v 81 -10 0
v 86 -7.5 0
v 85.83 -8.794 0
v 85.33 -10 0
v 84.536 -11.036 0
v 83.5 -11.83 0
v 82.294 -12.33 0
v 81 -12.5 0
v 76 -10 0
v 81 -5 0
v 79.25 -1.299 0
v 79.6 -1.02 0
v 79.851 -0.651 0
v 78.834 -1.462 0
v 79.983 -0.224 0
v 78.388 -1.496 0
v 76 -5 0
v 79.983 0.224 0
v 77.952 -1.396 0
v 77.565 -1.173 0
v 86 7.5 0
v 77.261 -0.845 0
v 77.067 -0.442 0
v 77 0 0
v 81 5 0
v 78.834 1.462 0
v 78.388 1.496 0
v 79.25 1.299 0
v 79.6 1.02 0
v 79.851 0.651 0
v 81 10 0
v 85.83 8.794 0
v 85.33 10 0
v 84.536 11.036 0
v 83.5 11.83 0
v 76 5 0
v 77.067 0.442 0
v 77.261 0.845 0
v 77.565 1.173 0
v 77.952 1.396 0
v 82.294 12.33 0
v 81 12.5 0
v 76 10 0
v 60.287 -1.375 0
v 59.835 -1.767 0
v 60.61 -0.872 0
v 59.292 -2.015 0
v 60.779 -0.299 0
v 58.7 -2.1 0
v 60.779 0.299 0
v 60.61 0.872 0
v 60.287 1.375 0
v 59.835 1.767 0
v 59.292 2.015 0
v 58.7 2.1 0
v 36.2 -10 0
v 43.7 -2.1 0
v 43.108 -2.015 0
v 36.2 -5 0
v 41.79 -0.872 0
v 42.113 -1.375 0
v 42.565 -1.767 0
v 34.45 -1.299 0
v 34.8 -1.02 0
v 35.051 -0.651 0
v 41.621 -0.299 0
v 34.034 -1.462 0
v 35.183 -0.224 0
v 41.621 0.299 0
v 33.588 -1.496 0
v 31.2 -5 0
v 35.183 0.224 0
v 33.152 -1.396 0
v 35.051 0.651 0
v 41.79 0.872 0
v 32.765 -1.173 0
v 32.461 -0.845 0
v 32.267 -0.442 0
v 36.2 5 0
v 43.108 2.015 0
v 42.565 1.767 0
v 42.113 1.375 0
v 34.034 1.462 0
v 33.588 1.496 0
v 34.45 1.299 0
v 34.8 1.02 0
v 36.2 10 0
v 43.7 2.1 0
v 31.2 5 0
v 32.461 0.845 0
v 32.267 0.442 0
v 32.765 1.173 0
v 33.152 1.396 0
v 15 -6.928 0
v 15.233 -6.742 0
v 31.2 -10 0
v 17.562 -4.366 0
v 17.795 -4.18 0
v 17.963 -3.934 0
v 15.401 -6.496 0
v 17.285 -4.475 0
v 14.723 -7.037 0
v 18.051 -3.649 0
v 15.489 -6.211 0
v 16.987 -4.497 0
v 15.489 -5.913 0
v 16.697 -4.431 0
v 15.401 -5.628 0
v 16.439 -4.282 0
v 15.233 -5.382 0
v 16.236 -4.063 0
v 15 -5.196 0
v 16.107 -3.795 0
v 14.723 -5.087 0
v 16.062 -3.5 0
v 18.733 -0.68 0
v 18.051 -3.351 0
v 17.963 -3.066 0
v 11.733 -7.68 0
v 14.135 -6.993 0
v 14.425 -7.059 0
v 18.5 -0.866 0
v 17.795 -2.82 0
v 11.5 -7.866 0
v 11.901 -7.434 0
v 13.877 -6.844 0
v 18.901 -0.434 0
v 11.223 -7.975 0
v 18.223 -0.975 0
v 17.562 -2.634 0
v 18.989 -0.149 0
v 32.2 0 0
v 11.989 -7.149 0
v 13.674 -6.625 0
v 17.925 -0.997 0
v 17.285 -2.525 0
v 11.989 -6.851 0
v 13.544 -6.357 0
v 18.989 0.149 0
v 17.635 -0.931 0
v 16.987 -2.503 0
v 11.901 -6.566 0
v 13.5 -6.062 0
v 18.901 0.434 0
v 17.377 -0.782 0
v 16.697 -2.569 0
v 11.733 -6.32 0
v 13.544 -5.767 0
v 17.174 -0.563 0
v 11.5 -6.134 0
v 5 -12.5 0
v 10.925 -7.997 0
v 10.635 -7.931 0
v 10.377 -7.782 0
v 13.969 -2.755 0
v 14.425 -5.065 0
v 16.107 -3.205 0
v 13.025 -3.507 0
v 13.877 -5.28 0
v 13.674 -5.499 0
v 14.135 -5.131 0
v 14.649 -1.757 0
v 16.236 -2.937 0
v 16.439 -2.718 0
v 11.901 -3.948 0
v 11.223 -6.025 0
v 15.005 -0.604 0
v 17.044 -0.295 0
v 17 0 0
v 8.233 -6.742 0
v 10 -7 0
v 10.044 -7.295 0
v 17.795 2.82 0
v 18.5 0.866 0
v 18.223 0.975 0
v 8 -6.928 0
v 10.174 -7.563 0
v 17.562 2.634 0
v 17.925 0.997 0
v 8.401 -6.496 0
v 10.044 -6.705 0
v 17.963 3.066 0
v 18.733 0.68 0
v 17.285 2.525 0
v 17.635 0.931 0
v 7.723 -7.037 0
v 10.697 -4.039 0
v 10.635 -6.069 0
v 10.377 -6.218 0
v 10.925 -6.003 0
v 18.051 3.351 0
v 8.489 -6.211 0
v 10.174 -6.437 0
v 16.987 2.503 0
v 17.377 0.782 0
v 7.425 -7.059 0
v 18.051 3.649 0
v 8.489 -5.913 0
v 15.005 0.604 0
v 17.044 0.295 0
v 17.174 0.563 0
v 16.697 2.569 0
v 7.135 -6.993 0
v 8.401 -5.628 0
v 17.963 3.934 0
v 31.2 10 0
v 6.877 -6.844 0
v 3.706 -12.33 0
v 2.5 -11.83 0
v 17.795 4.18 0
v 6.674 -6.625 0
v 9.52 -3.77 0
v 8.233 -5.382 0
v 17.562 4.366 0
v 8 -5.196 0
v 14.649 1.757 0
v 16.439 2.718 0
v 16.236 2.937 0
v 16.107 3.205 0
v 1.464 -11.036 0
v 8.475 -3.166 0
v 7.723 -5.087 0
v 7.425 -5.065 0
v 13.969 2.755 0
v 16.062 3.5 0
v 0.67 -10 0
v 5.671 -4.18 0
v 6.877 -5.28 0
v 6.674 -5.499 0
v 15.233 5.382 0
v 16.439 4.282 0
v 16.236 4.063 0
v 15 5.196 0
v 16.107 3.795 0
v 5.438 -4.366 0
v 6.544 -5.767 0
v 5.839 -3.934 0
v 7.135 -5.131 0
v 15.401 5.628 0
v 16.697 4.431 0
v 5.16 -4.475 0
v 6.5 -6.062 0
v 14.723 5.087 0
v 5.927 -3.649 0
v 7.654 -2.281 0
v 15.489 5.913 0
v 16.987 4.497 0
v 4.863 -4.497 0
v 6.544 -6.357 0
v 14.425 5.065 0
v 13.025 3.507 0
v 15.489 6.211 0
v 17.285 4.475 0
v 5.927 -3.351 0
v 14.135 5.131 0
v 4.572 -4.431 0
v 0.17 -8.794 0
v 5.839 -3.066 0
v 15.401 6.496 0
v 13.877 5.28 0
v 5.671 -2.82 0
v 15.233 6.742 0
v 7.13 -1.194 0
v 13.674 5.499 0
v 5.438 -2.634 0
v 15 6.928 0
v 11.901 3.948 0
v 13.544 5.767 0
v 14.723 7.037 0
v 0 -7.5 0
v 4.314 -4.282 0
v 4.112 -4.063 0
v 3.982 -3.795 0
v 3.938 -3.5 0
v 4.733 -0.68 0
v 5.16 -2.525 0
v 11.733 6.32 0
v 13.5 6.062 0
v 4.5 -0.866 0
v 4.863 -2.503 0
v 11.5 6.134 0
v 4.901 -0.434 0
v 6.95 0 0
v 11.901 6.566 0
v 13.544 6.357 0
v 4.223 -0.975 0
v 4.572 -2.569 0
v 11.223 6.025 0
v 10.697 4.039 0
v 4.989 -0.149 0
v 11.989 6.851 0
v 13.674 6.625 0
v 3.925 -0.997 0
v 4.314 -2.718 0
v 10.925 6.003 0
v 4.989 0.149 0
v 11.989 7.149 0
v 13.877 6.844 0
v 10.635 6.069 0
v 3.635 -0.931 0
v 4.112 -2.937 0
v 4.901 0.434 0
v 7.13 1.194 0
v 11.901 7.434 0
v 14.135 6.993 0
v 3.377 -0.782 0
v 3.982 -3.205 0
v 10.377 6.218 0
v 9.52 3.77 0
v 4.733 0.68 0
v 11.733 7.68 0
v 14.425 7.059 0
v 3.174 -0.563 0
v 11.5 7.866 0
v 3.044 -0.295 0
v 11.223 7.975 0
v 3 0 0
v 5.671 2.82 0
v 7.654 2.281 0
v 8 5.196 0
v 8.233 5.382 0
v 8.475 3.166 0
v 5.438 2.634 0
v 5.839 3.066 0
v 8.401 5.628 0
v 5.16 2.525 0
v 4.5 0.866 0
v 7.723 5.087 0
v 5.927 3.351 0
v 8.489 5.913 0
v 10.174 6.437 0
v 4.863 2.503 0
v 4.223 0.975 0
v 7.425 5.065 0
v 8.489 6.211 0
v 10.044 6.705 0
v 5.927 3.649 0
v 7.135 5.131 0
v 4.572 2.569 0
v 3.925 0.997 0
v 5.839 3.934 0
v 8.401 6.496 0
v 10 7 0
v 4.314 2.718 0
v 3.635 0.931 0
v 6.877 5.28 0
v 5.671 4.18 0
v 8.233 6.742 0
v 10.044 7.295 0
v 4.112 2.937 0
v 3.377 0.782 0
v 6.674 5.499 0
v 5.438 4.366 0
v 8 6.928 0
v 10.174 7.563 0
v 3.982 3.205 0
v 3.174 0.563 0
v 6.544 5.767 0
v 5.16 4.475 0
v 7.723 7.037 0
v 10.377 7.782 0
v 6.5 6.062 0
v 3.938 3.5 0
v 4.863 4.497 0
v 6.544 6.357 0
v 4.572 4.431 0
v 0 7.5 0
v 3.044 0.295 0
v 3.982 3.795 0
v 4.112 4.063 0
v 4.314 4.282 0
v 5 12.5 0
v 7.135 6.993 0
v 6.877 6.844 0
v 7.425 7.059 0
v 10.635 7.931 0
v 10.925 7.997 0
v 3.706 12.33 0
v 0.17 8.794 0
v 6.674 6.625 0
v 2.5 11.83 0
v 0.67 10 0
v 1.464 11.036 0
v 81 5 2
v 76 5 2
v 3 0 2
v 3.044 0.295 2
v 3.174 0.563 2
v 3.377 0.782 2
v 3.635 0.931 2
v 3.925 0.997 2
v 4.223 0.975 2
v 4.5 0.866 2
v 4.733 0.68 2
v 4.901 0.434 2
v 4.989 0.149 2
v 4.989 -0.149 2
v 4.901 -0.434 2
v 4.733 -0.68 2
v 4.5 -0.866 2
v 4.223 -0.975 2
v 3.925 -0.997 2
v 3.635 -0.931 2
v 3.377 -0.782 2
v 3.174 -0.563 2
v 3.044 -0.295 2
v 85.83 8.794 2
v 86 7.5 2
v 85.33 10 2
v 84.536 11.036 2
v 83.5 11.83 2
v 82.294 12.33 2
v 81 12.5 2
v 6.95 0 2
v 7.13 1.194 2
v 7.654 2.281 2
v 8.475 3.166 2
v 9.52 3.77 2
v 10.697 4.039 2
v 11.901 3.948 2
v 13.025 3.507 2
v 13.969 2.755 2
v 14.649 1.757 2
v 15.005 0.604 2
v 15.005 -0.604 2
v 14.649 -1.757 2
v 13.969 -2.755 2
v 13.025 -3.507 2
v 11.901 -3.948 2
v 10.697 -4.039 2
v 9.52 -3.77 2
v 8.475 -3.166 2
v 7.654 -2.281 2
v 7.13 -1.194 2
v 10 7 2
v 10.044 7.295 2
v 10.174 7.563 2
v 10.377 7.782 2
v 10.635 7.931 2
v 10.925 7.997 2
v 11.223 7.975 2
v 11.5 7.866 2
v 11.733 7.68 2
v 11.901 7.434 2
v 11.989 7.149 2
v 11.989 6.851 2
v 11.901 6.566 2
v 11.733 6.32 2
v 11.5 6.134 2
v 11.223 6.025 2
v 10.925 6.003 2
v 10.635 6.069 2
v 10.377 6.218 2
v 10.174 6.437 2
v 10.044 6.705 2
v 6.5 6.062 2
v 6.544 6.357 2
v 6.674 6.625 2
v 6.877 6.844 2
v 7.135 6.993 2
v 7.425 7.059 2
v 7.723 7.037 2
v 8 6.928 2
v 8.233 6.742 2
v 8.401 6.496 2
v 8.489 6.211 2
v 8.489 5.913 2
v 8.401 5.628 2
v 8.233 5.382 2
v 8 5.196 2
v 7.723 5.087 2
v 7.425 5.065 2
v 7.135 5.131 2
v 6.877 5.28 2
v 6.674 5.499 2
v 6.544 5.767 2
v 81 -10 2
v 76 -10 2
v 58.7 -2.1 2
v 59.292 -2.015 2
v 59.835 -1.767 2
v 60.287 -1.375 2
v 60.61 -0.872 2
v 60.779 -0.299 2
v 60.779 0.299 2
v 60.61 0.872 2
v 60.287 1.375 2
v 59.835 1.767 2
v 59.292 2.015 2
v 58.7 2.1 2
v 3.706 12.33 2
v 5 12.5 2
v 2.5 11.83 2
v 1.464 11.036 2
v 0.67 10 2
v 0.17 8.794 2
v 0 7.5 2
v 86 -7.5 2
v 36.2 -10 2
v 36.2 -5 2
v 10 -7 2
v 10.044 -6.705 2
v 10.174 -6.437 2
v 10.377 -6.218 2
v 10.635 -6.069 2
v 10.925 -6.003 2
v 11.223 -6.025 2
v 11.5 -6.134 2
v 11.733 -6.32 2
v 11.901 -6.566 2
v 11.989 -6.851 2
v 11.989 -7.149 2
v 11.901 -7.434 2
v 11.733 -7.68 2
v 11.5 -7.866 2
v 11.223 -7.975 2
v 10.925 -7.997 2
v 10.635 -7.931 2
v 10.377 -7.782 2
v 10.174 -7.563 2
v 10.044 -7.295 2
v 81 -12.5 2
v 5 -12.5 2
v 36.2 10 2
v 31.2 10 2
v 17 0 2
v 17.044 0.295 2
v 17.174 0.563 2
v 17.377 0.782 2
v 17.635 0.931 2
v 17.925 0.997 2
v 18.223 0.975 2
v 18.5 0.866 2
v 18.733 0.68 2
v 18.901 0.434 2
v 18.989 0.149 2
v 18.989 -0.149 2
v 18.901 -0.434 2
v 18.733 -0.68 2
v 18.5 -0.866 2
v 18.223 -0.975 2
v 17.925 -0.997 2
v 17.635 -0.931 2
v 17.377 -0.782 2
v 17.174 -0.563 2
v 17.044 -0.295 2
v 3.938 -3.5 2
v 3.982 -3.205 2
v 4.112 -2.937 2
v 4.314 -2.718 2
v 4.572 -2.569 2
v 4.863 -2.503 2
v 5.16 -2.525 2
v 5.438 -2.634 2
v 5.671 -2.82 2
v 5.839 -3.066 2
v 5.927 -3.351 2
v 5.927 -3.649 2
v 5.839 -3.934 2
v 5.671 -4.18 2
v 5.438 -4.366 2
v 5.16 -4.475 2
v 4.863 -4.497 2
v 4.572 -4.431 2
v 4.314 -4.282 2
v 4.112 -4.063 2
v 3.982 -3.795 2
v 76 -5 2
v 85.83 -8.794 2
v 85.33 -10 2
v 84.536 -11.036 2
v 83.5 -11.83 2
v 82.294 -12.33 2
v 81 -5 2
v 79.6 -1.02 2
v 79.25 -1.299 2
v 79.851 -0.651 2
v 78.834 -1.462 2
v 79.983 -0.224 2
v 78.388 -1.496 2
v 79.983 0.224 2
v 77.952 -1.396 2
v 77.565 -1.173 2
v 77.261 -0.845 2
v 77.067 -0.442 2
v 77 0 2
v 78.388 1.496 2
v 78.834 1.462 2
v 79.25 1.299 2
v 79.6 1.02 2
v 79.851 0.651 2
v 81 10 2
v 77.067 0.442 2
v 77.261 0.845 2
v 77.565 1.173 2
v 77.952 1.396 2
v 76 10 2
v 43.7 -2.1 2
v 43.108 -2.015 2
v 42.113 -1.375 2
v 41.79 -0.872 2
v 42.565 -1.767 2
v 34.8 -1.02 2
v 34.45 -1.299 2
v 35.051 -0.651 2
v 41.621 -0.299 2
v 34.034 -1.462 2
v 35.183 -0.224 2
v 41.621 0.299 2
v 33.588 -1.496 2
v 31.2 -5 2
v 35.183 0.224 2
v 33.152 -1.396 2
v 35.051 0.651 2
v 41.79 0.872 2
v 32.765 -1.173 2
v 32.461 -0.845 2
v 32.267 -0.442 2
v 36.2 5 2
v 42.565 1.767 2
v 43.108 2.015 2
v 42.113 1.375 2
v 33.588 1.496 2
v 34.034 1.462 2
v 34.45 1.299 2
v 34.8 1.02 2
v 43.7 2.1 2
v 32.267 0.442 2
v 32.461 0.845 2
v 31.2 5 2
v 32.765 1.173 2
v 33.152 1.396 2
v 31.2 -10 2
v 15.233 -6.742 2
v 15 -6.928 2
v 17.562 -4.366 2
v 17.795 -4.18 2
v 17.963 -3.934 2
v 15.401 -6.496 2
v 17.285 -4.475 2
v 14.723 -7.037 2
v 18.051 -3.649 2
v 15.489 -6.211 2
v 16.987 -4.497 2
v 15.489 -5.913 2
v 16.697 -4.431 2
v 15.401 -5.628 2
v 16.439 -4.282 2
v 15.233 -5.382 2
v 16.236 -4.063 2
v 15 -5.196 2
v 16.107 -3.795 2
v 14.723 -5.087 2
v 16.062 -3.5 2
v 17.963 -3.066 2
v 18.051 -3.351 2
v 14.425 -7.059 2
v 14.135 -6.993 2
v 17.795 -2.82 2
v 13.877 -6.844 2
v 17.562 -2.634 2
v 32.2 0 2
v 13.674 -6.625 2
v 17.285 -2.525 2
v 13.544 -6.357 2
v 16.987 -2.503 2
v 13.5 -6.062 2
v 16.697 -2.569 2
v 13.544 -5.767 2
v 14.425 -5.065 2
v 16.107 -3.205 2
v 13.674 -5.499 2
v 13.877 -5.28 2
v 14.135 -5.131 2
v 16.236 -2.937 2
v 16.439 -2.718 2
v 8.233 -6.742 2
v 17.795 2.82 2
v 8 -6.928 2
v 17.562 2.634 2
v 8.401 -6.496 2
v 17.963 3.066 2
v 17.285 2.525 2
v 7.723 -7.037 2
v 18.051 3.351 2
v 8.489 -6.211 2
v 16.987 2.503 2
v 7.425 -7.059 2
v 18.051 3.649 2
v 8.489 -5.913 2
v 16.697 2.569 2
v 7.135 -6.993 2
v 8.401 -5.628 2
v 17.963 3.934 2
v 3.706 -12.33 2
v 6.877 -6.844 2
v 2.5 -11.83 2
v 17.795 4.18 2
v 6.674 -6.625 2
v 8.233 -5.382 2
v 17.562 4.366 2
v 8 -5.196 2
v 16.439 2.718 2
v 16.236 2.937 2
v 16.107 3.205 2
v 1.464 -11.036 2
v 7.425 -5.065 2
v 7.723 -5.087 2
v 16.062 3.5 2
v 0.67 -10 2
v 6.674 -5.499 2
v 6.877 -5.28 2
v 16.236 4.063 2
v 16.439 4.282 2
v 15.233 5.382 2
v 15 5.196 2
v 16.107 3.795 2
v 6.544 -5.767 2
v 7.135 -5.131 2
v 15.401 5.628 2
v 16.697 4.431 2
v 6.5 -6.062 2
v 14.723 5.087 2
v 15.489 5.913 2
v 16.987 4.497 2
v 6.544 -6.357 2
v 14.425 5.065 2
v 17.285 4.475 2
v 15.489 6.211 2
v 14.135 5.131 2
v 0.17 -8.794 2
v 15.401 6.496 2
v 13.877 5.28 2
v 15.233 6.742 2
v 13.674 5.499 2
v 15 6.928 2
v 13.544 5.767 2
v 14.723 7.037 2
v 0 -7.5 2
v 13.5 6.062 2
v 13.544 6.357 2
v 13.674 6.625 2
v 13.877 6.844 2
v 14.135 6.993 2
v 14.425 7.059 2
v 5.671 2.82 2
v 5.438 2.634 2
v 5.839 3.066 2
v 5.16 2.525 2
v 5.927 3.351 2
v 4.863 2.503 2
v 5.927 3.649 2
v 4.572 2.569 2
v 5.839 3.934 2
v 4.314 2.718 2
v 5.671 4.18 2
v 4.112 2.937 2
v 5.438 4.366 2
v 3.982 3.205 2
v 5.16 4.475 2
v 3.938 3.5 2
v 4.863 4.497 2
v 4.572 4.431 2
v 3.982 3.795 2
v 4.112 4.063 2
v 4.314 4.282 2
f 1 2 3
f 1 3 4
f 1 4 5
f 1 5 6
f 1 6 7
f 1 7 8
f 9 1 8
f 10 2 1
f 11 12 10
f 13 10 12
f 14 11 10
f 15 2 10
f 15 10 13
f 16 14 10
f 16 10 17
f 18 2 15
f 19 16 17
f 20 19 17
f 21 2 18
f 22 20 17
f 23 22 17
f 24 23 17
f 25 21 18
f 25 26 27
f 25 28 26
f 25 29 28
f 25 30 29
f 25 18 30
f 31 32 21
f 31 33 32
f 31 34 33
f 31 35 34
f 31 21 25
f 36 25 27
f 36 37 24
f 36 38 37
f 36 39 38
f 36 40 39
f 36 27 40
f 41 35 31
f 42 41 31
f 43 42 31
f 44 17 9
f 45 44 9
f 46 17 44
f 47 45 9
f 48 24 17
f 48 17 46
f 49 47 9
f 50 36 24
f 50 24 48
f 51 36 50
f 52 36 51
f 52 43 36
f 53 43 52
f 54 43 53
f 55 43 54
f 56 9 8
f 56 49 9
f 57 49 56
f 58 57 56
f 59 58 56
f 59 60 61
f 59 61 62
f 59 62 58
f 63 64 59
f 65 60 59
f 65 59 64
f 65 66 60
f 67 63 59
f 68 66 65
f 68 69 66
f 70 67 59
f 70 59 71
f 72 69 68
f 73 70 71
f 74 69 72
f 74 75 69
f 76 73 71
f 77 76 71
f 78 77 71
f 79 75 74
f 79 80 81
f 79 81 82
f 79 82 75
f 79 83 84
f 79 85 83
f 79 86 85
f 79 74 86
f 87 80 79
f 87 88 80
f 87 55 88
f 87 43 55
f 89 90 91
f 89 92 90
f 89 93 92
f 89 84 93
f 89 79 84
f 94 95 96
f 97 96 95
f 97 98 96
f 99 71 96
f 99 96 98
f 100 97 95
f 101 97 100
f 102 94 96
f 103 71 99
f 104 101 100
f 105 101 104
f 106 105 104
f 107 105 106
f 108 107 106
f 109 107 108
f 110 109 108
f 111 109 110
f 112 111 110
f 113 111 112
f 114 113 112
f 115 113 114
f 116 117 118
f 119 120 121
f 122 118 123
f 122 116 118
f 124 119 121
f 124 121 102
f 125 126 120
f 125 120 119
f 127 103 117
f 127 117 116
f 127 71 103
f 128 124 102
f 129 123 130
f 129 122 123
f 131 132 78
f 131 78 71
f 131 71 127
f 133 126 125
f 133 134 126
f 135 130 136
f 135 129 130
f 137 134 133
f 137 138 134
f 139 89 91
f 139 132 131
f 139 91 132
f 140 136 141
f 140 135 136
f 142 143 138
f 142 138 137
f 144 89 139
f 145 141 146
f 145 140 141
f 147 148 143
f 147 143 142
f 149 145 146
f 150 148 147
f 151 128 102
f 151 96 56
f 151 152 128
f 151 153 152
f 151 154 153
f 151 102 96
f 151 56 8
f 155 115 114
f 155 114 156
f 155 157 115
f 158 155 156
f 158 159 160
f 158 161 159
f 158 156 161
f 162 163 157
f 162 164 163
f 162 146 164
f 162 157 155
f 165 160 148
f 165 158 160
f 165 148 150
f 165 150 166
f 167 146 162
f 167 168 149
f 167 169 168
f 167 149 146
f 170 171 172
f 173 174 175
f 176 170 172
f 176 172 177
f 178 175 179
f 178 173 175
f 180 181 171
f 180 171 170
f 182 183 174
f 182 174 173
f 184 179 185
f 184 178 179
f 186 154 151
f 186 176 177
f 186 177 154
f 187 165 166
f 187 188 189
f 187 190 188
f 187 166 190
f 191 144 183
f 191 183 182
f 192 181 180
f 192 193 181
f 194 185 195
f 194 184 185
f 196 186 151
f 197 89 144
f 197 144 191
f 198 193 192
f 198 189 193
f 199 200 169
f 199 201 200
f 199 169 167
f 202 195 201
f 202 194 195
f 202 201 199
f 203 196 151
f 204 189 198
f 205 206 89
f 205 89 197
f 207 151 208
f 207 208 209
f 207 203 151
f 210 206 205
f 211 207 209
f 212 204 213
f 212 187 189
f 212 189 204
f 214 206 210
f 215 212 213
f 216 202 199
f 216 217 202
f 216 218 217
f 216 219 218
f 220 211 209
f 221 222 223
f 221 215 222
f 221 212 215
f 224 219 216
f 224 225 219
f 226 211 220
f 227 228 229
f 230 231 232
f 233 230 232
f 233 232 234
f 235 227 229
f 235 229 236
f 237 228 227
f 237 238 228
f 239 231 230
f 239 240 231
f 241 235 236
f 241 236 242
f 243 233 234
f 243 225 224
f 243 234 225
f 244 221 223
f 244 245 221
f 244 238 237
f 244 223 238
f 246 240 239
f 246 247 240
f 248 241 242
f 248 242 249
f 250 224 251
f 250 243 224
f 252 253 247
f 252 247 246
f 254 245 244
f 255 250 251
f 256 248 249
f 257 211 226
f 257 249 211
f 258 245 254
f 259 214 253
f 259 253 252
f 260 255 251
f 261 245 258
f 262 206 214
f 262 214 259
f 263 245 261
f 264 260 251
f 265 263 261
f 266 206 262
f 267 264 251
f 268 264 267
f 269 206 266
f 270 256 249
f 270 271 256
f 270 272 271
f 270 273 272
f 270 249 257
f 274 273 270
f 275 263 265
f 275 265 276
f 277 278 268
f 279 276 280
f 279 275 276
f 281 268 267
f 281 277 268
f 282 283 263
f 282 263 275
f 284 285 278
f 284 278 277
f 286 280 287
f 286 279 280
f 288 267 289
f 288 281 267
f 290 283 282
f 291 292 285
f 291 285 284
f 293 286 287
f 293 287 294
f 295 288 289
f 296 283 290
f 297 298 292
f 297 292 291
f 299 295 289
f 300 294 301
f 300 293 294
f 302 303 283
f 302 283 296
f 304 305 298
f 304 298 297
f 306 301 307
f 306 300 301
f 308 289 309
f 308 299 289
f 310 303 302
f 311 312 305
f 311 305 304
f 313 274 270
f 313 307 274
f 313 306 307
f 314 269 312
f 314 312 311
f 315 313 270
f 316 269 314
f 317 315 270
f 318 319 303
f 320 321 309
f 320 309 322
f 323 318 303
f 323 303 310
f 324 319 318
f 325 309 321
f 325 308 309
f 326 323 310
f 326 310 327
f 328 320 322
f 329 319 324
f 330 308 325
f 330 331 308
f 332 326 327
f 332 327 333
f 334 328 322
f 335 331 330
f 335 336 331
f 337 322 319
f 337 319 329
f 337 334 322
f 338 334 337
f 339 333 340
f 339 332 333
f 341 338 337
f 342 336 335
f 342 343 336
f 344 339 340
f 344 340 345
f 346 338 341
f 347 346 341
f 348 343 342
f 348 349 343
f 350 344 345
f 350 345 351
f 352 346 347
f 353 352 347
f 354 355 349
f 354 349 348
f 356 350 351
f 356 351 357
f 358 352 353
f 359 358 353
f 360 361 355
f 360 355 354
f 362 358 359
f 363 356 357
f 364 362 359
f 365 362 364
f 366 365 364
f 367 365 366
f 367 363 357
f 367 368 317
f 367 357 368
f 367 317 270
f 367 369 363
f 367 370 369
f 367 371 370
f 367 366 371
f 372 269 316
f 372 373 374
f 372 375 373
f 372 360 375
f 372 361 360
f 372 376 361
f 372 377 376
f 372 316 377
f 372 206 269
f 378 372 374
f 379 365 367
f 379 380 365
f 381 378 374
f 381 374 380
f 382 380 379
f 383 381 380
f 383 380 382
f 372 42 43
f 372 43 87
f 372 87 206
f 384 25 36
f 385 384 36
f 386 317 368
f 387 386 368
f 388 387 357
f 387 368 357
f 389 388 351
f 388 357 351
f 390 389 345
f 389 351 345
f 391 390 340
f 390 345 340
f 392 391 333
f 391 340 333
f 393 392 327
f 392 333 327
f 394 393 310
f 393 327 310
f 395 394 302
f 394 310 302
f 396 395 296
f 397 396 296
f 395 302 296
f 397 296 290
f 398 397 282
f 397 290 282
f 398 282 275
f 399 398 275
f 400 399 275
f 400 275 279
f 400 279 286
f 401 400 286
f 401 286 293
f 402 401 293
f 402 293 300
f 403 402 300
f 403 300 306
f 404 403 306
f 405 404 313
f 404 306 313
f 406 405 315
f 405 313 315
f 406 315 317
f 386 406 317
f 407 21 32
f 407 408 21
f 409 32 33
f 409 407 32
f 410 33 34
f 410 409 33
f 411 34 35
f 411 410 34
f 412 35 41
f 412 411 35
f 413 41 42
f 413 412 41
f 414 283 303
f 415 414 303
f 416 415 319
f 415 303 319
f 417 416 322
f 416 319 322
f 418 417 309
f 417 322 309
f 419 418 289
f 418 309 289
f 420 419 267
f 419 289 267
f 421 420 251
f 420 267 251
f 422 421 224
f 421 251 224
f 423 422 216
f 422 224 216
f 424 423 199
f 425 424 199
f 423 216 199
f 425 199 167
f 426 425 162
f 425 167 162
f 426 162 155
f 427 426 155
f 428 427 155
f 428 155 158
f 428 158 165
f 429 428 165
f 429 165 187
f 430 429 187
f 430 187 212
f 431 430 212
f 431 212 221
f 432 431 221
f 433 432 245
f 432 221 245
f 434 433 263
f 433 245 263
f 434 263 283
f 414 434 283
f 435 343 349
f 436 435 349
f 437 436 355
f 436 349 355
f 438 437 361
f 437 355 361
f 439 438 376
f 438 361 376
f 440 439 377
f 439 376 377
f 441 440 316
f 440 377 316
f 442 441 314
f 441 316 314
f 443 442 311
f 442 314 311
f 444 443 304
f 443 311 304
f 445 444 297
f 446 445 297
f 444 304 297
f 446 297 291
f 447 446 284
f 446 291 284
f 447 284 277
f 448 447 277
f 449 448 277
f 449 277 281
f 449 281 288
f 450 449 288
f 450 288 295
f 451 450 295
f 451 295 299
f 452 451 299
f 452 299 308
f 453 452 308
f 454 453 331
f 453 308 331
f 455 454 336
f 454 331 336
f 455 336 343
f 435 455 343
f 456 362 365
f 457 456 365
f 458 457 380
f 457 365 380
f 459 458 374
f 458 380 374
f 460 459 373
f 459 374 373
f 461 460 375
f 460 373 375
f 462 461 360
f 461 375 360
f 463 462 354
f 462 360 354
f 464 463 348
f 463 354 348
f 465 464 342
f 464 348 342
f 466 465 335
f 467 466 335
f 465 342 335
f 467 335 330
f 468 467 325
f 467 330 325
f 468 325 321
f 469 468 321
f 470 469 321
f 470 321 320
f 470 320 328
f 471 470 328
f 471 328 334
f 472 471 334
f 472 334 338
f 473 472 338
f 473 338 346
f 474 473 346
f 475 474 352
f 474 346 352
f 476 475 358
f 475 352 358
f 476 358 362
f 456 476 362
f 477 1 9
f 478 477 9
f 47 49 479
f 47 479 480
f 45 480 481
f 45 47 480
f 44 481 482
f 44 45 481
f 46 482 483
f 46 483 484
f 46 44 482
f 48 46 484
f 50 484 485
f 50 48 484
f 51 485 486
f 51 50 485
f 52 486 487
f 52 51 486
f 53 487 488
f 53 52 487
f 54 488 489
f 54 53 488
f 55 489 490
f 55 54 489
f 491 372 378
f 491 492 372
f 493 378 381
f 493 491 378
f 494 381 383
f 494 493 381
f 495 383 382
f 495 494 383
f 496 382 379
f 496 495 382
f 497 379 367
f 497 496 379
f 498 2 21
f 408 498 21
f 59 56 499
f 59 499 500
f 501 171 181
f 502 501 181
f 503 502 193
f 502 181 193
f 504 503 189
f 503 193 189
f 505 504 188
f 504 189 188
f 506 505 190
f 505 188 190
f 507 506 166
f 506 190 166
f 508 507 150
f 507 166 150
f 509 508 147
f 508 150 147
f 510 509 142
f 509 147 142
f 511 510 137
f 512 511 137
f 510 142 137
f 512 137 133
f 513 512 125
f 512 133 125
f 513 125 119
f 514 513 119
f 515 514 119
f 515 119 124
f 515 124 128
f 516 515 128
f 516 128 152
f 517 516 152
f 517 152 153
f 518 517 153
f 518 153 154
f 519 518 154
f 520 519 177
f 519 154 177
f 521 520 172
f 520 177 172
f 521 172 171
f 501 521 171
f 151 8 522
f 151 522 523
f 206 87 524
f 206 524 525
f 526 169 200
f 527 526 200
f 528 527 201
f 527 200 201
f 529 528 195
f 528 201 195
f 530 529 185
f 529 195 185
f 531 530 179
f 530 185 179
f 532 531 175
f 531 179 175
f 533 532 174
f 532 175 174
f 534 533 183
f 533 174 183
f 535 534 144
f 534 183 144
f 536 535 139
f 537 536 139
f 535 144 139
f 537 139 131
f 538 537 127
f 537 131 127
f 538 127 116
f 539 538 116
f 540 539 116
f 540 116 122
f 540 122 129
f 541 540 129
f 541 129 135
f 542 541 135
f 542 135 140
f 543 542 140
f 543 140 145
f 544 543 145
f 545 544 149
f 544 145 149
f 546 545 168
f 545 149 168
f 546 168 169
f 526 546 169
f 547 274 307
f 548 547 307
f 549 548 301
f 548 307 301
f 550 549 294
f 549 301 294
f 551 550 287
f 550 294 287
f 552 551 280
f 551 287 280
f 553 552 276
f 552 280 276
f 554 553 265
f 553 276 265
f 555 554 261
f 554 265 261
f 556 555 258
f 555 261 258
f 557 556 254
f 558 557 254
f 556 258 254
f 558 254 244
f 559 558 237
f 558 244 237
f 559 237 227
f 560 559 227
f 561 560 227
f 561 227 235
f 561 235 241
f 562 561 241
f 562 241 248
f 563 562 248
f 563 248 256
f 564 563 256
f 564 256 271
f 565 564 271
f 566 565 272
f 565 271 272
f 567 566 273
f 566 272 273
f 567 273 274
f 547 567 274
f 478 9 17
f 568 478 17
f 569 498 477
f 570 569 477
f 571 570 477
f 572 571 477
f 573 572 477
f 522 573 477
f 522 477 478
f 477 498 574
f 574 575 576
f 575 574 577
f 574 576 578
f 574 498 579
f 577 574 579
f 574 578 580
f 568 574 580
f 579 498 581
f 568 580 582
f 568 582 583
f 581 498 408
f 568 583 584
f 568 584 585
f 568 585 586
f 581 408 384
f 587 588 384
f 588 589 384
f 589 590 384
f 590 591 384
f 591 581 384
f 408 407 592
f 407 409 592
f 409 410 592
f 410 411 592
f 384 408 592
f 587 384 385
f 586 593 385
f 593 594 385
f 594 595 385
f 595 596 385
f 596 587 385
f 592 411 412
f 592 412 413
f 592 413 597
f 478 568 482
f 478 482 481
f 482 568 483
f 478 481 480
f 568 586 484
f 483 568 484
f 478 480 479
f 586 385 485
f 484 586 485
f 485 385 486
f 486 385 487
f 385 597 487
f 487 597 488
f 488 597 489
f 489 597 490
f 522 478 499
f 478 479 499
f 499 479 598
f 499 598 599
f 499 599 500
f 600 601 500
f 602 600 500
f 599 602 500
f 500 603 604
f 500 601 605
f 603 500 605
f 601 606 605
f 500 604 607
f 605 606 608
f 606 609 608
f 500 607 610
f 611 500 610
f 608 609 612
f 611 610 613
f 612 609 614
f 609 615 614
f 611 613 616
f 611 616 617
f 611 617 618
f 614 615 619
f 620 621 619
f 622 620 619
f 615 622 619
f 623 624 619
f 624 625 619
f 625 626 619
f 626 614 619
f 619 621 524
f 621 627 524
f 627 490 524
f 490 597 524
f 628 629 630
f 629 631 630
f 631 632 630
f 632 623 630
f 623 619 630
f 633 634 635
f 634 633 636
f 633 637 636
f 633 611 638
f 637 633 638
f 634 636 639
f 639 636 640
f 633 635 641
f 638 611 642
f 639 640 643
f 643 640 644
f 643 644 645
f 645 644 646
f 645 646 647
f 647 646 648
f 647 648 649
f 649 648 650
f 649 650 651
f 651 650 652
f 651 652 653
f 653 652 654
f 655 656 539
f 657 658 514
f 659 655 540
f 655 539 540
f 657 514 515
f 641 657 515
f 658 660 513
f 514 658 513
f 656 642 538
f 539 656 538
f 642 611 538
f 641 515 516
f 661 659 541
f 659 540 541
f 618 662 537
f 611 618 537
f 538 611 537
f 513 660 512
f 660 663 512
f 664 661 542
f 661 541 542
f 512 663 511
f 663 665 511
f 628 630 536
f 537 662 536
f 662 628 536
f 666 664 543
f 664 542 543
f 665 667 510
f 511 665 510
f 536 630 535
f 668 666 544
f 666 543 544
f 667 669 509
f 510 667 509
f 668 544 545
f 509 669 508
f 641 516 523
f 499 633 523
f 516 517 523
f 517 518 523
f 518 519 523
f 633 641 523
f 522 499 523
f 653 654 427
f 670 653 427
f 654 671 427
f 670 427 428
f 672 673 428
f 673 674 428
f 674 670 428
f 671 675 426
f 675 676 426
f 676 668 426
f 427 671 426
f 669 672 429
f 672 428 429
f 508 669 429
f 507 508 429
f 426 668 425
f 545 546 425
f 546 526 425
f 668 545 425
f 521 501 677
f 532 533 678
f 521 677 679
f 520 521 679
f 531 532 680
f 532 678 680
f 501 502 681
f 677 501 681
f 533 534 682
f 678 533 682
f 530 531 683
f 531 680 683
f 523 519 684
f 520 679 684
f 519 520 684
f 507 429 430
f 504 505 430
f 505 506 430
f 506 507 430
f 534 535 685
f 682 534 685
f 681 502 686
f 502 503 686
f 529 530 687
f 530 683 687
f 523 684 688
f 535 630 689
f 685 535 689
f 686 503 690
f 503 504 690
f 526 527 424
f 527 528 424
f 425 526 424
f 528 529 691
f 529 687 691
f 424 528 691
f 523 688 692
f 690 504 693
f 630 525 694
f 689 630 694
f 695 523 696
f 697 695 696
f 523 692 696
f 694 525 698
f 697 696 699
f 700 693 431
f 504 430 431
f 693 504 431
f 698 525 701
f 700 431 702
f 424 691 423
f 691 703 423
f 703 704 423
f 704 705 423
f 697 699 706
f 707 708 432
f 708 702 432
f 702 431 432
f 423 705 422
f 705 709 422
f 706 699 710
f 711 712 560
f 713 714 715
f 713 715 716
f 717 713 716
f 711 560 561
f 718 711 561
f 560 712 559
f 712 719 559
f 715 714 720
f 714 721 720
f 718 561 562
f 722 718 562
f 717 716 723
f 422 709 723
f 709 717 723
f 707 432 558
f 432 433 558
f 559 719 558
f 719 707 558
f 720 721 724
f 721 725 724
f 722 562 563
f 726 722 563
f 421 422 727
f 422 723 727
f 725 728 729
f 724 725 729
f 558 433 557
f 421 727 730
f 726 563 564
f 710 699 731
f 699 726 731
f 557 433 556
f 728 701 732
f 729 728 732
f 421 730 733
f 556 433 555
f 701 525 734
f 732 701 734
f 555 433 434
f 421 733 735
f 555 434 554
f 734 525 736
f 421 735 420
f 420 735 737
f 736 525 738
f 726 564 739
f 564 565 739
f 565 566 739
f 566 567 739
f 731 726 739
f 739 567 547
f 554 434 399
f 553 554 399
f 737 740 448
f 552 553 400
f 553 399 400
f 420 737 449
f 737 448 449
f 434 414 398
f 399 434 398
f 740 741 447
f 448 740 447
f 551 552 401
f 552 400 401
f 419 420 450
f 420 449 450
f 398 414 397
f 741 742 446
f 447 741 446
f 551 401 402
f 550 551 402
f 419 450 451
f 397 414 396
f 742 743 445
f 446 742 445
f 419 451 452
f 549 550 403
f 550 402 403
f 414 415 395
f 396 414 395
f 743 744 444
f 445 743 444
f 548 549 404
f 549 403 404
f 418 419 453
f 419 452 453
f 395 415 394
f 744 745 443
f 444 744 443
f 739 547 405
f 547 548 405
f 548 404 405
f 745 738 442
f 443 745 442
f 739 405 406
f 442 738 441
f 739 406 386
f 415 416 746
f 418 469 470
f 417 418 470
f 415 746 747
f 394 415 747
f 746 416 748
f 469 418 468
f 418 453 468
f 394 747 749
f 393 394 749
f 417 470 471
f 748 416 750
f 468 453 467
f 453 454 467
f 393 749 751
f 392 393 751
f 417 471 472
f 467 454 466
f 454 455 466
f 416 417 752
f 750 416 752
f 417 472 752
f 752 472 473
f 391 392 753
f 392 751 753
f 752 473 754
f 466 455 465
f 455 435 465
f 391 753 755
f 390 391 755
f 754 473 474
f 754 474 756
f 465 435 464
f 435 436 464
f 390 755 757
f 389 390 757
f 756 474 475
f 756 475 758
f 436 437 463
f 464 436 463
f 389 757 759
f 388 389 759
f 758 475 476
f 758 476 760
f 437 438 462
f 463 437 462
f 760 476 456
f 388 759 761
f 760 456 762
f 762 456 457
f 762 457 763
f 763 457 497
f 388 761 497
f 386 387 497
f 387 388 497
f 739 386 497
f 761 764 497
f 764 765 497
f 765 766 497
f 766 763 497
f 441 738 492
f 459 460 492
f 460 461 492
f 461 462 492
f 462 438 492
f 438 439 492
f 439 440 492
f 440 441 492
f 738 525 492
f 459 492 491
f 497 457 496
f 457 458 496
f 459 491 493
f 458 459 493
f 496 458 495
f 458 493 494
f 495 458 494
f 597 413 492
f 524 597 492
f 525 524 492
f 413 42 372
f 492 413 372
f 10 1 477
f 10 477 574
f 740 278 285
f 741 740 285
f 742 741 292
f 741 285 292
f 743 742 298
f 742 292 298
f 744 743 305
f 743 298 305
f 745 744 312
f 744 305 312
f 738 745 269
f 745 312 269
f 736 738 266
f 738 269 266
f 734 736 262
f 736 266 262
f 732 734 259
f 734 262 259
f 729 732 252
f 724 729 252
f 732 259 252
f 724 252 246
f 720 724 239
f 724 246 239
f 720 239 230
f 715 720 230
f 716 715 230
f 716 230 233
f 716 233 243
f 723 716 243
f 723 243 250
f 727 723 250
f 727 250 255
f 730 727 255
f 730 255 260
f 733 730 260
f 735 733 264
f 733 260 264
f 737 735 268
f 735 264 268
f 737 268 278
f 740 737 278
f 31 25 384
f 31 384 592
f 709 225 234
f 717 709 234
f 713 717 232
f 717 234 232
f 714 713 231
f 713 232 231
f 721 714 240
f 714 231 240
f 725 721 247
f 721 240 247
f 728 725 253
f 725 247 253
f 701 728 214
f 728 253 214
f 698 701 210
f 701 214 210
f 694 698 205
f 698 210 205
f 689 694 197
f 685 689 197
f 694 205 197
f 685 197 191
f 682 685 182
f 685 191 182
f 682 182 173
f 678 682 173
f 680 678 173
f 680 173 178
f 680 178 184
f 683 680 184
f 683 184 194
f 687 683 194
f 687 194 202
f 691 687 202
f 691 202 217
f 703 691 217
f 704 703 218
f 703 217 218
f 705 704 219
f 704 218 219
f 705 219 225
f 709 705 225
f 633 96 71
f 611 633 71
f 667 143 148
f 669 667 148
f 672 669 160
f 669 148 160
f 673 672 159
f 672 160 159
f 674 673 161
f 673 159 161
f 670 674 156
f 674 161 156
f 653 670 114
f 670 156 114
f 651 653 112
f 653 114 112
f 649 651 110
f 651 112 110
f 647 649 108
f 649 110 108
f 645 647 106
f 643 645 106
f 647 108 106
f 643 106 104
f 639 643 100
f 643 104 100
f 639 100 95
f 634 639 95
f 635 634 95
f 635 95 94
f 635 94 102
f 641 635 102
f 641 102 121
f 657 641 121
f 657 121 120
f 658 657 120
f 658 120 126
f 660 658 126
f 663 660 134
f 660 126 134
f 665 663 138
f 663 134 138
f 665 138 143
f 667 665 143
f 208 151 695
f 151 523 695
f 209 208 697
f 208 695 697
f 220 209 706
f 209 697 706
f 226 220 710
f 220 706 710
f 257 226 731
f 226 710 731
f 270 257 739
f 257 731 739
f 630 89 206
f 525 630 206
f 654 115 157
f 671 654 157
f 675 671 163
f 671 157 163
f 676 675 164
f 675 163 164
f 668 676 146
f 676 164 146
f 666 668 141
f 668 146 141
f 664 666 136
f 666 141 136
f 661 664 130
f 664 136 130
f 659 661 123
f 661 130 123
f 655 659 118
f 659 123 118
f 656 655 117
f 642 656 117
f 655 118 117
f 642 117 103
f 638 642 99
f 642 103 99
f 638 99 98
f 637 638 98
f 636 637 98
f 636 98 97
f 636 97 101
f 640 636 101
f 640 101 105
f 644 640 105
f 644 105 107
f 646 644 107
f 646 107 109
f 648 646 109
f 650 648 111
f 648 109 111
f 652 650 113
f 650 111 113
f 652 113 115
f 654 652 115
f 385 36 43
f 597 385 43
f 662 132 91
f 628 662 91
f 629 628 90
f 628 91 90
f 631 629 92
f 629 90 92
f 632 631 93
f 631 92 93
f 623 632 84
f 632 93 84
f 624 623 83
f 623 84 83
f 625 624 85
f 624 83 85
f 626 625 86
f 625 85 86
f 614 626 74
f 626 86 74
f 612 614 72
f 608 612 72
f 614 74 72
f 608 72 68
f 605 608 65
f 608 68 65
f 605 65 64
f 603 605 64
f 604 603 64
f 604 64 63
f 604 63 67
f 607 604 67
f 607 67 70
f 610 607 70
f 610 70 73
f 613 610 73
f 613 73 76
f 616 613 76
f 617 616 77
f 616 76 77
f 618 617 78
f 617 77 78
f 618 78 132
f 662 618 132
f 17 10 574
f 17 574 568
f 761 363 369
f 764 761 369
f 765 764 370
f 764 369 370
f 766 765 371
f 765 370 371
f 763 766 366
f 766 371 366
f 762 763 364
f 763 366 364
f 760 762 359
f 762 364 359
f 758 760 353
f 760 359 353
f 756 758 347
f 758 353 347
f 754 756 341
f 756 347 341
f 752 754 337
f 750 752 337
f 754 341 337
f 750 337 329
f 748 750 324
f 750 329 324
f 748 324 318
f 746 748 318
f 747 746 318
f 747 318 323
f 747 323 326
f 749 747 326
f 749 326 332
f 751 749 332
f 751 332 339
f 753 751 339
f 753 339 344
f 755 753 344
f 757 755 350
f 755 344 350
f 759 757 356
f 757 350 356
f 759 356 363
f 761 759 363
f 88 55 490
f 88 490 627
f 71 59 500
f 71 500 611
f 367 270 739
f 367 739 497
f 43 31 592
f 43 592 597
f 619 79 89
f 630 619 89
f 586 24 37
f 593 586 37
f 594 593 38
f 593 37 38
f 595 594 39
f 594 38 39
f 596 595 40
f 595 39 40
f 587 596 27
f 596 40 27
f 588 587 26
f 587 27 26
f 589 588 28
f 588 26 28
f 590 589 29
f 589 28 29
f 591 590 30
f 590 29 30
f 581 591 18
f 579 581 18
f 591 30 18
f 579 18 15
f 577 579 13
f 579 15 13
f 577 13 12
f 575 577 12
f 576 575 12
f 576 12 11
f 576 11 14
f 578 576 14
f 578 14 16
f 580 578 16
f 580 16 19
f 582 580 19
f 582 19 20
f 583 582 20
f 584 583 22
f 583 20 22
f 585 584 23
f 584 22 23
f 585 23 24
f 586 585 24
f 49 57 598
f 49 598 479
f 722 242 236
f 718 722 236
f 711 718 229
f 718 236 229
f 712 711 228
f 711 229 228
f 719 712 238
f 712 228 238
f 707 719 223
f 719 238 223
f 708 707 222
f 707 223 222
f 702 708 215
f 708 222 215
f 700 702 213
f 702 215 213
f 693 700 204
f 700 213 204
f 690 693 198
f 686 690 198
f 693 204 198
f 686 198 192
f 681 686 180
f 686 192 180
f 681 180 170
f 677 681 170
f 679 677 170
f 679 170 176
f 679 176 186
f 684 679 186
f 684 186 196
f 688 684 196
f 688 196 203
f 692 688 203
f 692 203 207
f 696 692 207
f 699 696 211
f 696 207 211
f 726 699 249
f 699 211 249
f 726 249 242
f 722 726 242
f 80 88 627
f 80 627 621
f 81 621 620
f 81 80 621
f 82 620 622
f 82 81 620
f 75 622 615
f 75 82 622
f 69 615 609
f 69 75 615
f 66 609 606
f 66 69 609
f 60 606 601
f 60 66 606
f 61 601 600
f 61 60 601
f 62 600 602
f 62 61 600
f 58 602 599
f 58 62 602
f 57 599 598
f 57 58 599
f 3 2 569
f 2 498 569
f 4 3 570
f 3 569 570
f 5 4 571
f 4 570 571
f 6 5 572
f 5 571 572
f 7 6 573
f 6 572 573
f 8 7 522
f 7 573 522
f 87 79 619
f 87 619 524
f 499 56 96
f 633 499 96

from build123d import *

# Parameters (mm, degrees)
ESQUISSE2_W        = 86
ESQUISSE2_H        = 25
ESQUISSE2_R        = 4.05
ESQUISSE2_R_2      = 1
ESQUISSE2_R_3      = 1.5
ESQUISSE2_W_2      = 5
ESQUISSE2_H_2      = 5
BOSS_EXTRU_1_DEPTH = 2
CONG_1_R           = 5


with BuildPart() as part:
    # Esquisse2 → Boss.-Extru.1 (new body)
    with BuildSketch(Plane(origin=(0, 0, 0), x_dir=(-1, 0, 0), z_dir=(0, 0, -1))):
        with Locations((-43, 0)):
            Rectangle(ESQUISSE2_W, ESQUISSE2_H)
        with Locations((-11, 0)):
            Circle(ESQUISSE2_R, mode=Mode.SUBTRACT)
        with Locations((-4, 0)):
            Circle(ESQUISSE2_R_2, mode=Mode.SUBTRACT)
        with Locations((-4.937822174, -3.5)):
            Circle(ESQUISSE2_R_2, mode=Mode.SUBTRACT)
        with Locations((-7.5, -6.062177826)):
            Circle(ESQUISSE2_R_2, mode=Mode.SUBTRACT)
        with Locations((-11, -7)):
            Circle(ESQUISSE2_R_2, mode=Mode.SUBTRACT)
        with Locations((-14.5, -6.062177826)):
            Circle(ESQUISSE2_R_2, mode=Mode.SUBTRACT)
        with Locations((-17.062177826, -3.5)):
            Circle(ESQUISSE2_R_2, mode=Mode.SUBTRACT)
        with Locations((-18, 0)):
            Circle(ESQUISSE2_R_2, mode=Mode.SUBTRACT)
        with Locations((-17.062177826, 3.5)):
            Circle(ESQUISSE2_R_2, mode=Mode.SUBTRACT)
        with Locations((-14.5, 6.062177826)):
            Circle(ESQUISSE2_R_2, mode=Mode.SUBTRACT)
        with Locations((-11, 7)):
            Circle(ESQUISSE2_R_2, mode=Mode.SUBTRACT)
        with Locations((-7.5, 6.062177826)):
            Circle(ESQUISSE2_R_2, mode=Mode.SUBTRACT)
        with Locations((-4.937822174, 3.5)):
            Circle(ESQUISSE2_R_2, mode=Mode.SUBTRACT)
        with Locations((-78.5, 0)):
            Circle(ESQUISSE2_R_3, mode=Mode.SUBTRACT)
        with Locations((-33.7, 0)):
            Circle(ESQUISSE2_R_3, mode=Mode.SUBTRACT)
        with BuildLine():
            Line((-43.7, -2.1), (-58.7, -2.1))
            ThreePointArc((-58.7, -2.1), (-60.8, 0), (-58.7, 2.1))
            Line((-58.7, 2.1), (-43.7, 2.1))
            ThreePointArc((-43.7, 2.1), (-41.6, 0), (-43.7, -2.1))
        make_face(mode=Mode.SUBTRACT)
        with Locations((-78.5, -7.5)):
            Rectangle(ESQUISSE2_W_2, ESQUISSE2_H_2, mode=Mode.SUBTRACT)
        with Locations((-78.5, 7.5)):
            Rectangle(ESQUISSE2_W_2, ESQUISSE2_H_2, mode=Mode.SUBTRACT)
        with Locations((-33.7, -7.5)):
            Rectangle(ESQUISSE2_W_2, ESQUISSE2_H_2, mode=Mode.SUBTRACT)
        with Locations((-33.7, 7.5)):
            Rectangle(ESQUISSE2_W_2, ESQUISSE2_H_2, mode=Mode.SUBTRACT)
    extrude(amount=-BOSS_EXTRU_1_DEPTH)

    # Congé1
    cong_1_edges = [part.edges().sort_by_distance(p)[0] for p in [
        (86, 12.5, 1),
        (0, 12.5, 1),
        (0, -12.5, 1),
        (86, -12.5, 1),
    ]]
    fillet(cong_1_edges, radius=CONG_1_R)


solid = part.part
